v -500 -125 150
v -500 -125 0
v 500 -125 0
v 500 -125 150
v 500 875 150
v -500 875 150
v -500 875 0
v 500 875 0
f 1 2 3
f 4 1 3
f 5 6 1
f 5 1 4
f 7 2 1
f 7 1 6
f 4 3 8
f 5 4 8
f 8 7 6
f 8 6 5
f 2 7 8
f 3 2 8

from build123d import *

# Parameters (mm, degrees)
SKETCH_1_W      = 1000
SKETCH_1_H      = 250
EXTRUDE_1_DEPTH = 150
SKETCH_2_W      = 1000
SKETCH_2_H      = 250
EXTRUDE_2_DEPTH = 150
SKETCH_3_W      = 1000
SKETCH_3_H      = 250
EXTRUDE_3_DEPTH = 150
SKETCH_4_W      = 1000
SKETCH_4_H      = 250
EXTRUDE_4_DEPTH = 150


with BuildPart() as part:
    # 草图1 → 凸台-拉伸1 (new body)
    with BuildSketch(Plane.XY):
        Rectangle(SKETCH_1_W, SKETCH_1_H)
    extrude(amount=EXTRUDE_1_DEPTH)

    # 草图2 → 凸台-拉伸2 (add)
    with BuildSketch(Plane.XY):
        with Locations((0, 250)):
            Rectangle(SKETCH_2_W, SKETCH_2_H)
    extrude(amount=EXTRUDE_2_DEPTH)

    # 草图3 → 凸台-拉伸3 (add)
    with BuildSketch(Plane.XY):
        with Locations((0, 500)):
            Rectangle(SKETCH_3_W, SKETCH_3_H)
    extrude(amount=EXTRUDE_3_DEPTH)

    # 草图4 → 凸台-拉伸4 (add)
    with BuildSketch(Plane.XY):
        with Locations((0, 750)):
            Rectangle(SKETCH_4_W, SKETCH_4_H)
    extrude(amount=EXTRUDE_4_DEPTH)


solid = part.part
